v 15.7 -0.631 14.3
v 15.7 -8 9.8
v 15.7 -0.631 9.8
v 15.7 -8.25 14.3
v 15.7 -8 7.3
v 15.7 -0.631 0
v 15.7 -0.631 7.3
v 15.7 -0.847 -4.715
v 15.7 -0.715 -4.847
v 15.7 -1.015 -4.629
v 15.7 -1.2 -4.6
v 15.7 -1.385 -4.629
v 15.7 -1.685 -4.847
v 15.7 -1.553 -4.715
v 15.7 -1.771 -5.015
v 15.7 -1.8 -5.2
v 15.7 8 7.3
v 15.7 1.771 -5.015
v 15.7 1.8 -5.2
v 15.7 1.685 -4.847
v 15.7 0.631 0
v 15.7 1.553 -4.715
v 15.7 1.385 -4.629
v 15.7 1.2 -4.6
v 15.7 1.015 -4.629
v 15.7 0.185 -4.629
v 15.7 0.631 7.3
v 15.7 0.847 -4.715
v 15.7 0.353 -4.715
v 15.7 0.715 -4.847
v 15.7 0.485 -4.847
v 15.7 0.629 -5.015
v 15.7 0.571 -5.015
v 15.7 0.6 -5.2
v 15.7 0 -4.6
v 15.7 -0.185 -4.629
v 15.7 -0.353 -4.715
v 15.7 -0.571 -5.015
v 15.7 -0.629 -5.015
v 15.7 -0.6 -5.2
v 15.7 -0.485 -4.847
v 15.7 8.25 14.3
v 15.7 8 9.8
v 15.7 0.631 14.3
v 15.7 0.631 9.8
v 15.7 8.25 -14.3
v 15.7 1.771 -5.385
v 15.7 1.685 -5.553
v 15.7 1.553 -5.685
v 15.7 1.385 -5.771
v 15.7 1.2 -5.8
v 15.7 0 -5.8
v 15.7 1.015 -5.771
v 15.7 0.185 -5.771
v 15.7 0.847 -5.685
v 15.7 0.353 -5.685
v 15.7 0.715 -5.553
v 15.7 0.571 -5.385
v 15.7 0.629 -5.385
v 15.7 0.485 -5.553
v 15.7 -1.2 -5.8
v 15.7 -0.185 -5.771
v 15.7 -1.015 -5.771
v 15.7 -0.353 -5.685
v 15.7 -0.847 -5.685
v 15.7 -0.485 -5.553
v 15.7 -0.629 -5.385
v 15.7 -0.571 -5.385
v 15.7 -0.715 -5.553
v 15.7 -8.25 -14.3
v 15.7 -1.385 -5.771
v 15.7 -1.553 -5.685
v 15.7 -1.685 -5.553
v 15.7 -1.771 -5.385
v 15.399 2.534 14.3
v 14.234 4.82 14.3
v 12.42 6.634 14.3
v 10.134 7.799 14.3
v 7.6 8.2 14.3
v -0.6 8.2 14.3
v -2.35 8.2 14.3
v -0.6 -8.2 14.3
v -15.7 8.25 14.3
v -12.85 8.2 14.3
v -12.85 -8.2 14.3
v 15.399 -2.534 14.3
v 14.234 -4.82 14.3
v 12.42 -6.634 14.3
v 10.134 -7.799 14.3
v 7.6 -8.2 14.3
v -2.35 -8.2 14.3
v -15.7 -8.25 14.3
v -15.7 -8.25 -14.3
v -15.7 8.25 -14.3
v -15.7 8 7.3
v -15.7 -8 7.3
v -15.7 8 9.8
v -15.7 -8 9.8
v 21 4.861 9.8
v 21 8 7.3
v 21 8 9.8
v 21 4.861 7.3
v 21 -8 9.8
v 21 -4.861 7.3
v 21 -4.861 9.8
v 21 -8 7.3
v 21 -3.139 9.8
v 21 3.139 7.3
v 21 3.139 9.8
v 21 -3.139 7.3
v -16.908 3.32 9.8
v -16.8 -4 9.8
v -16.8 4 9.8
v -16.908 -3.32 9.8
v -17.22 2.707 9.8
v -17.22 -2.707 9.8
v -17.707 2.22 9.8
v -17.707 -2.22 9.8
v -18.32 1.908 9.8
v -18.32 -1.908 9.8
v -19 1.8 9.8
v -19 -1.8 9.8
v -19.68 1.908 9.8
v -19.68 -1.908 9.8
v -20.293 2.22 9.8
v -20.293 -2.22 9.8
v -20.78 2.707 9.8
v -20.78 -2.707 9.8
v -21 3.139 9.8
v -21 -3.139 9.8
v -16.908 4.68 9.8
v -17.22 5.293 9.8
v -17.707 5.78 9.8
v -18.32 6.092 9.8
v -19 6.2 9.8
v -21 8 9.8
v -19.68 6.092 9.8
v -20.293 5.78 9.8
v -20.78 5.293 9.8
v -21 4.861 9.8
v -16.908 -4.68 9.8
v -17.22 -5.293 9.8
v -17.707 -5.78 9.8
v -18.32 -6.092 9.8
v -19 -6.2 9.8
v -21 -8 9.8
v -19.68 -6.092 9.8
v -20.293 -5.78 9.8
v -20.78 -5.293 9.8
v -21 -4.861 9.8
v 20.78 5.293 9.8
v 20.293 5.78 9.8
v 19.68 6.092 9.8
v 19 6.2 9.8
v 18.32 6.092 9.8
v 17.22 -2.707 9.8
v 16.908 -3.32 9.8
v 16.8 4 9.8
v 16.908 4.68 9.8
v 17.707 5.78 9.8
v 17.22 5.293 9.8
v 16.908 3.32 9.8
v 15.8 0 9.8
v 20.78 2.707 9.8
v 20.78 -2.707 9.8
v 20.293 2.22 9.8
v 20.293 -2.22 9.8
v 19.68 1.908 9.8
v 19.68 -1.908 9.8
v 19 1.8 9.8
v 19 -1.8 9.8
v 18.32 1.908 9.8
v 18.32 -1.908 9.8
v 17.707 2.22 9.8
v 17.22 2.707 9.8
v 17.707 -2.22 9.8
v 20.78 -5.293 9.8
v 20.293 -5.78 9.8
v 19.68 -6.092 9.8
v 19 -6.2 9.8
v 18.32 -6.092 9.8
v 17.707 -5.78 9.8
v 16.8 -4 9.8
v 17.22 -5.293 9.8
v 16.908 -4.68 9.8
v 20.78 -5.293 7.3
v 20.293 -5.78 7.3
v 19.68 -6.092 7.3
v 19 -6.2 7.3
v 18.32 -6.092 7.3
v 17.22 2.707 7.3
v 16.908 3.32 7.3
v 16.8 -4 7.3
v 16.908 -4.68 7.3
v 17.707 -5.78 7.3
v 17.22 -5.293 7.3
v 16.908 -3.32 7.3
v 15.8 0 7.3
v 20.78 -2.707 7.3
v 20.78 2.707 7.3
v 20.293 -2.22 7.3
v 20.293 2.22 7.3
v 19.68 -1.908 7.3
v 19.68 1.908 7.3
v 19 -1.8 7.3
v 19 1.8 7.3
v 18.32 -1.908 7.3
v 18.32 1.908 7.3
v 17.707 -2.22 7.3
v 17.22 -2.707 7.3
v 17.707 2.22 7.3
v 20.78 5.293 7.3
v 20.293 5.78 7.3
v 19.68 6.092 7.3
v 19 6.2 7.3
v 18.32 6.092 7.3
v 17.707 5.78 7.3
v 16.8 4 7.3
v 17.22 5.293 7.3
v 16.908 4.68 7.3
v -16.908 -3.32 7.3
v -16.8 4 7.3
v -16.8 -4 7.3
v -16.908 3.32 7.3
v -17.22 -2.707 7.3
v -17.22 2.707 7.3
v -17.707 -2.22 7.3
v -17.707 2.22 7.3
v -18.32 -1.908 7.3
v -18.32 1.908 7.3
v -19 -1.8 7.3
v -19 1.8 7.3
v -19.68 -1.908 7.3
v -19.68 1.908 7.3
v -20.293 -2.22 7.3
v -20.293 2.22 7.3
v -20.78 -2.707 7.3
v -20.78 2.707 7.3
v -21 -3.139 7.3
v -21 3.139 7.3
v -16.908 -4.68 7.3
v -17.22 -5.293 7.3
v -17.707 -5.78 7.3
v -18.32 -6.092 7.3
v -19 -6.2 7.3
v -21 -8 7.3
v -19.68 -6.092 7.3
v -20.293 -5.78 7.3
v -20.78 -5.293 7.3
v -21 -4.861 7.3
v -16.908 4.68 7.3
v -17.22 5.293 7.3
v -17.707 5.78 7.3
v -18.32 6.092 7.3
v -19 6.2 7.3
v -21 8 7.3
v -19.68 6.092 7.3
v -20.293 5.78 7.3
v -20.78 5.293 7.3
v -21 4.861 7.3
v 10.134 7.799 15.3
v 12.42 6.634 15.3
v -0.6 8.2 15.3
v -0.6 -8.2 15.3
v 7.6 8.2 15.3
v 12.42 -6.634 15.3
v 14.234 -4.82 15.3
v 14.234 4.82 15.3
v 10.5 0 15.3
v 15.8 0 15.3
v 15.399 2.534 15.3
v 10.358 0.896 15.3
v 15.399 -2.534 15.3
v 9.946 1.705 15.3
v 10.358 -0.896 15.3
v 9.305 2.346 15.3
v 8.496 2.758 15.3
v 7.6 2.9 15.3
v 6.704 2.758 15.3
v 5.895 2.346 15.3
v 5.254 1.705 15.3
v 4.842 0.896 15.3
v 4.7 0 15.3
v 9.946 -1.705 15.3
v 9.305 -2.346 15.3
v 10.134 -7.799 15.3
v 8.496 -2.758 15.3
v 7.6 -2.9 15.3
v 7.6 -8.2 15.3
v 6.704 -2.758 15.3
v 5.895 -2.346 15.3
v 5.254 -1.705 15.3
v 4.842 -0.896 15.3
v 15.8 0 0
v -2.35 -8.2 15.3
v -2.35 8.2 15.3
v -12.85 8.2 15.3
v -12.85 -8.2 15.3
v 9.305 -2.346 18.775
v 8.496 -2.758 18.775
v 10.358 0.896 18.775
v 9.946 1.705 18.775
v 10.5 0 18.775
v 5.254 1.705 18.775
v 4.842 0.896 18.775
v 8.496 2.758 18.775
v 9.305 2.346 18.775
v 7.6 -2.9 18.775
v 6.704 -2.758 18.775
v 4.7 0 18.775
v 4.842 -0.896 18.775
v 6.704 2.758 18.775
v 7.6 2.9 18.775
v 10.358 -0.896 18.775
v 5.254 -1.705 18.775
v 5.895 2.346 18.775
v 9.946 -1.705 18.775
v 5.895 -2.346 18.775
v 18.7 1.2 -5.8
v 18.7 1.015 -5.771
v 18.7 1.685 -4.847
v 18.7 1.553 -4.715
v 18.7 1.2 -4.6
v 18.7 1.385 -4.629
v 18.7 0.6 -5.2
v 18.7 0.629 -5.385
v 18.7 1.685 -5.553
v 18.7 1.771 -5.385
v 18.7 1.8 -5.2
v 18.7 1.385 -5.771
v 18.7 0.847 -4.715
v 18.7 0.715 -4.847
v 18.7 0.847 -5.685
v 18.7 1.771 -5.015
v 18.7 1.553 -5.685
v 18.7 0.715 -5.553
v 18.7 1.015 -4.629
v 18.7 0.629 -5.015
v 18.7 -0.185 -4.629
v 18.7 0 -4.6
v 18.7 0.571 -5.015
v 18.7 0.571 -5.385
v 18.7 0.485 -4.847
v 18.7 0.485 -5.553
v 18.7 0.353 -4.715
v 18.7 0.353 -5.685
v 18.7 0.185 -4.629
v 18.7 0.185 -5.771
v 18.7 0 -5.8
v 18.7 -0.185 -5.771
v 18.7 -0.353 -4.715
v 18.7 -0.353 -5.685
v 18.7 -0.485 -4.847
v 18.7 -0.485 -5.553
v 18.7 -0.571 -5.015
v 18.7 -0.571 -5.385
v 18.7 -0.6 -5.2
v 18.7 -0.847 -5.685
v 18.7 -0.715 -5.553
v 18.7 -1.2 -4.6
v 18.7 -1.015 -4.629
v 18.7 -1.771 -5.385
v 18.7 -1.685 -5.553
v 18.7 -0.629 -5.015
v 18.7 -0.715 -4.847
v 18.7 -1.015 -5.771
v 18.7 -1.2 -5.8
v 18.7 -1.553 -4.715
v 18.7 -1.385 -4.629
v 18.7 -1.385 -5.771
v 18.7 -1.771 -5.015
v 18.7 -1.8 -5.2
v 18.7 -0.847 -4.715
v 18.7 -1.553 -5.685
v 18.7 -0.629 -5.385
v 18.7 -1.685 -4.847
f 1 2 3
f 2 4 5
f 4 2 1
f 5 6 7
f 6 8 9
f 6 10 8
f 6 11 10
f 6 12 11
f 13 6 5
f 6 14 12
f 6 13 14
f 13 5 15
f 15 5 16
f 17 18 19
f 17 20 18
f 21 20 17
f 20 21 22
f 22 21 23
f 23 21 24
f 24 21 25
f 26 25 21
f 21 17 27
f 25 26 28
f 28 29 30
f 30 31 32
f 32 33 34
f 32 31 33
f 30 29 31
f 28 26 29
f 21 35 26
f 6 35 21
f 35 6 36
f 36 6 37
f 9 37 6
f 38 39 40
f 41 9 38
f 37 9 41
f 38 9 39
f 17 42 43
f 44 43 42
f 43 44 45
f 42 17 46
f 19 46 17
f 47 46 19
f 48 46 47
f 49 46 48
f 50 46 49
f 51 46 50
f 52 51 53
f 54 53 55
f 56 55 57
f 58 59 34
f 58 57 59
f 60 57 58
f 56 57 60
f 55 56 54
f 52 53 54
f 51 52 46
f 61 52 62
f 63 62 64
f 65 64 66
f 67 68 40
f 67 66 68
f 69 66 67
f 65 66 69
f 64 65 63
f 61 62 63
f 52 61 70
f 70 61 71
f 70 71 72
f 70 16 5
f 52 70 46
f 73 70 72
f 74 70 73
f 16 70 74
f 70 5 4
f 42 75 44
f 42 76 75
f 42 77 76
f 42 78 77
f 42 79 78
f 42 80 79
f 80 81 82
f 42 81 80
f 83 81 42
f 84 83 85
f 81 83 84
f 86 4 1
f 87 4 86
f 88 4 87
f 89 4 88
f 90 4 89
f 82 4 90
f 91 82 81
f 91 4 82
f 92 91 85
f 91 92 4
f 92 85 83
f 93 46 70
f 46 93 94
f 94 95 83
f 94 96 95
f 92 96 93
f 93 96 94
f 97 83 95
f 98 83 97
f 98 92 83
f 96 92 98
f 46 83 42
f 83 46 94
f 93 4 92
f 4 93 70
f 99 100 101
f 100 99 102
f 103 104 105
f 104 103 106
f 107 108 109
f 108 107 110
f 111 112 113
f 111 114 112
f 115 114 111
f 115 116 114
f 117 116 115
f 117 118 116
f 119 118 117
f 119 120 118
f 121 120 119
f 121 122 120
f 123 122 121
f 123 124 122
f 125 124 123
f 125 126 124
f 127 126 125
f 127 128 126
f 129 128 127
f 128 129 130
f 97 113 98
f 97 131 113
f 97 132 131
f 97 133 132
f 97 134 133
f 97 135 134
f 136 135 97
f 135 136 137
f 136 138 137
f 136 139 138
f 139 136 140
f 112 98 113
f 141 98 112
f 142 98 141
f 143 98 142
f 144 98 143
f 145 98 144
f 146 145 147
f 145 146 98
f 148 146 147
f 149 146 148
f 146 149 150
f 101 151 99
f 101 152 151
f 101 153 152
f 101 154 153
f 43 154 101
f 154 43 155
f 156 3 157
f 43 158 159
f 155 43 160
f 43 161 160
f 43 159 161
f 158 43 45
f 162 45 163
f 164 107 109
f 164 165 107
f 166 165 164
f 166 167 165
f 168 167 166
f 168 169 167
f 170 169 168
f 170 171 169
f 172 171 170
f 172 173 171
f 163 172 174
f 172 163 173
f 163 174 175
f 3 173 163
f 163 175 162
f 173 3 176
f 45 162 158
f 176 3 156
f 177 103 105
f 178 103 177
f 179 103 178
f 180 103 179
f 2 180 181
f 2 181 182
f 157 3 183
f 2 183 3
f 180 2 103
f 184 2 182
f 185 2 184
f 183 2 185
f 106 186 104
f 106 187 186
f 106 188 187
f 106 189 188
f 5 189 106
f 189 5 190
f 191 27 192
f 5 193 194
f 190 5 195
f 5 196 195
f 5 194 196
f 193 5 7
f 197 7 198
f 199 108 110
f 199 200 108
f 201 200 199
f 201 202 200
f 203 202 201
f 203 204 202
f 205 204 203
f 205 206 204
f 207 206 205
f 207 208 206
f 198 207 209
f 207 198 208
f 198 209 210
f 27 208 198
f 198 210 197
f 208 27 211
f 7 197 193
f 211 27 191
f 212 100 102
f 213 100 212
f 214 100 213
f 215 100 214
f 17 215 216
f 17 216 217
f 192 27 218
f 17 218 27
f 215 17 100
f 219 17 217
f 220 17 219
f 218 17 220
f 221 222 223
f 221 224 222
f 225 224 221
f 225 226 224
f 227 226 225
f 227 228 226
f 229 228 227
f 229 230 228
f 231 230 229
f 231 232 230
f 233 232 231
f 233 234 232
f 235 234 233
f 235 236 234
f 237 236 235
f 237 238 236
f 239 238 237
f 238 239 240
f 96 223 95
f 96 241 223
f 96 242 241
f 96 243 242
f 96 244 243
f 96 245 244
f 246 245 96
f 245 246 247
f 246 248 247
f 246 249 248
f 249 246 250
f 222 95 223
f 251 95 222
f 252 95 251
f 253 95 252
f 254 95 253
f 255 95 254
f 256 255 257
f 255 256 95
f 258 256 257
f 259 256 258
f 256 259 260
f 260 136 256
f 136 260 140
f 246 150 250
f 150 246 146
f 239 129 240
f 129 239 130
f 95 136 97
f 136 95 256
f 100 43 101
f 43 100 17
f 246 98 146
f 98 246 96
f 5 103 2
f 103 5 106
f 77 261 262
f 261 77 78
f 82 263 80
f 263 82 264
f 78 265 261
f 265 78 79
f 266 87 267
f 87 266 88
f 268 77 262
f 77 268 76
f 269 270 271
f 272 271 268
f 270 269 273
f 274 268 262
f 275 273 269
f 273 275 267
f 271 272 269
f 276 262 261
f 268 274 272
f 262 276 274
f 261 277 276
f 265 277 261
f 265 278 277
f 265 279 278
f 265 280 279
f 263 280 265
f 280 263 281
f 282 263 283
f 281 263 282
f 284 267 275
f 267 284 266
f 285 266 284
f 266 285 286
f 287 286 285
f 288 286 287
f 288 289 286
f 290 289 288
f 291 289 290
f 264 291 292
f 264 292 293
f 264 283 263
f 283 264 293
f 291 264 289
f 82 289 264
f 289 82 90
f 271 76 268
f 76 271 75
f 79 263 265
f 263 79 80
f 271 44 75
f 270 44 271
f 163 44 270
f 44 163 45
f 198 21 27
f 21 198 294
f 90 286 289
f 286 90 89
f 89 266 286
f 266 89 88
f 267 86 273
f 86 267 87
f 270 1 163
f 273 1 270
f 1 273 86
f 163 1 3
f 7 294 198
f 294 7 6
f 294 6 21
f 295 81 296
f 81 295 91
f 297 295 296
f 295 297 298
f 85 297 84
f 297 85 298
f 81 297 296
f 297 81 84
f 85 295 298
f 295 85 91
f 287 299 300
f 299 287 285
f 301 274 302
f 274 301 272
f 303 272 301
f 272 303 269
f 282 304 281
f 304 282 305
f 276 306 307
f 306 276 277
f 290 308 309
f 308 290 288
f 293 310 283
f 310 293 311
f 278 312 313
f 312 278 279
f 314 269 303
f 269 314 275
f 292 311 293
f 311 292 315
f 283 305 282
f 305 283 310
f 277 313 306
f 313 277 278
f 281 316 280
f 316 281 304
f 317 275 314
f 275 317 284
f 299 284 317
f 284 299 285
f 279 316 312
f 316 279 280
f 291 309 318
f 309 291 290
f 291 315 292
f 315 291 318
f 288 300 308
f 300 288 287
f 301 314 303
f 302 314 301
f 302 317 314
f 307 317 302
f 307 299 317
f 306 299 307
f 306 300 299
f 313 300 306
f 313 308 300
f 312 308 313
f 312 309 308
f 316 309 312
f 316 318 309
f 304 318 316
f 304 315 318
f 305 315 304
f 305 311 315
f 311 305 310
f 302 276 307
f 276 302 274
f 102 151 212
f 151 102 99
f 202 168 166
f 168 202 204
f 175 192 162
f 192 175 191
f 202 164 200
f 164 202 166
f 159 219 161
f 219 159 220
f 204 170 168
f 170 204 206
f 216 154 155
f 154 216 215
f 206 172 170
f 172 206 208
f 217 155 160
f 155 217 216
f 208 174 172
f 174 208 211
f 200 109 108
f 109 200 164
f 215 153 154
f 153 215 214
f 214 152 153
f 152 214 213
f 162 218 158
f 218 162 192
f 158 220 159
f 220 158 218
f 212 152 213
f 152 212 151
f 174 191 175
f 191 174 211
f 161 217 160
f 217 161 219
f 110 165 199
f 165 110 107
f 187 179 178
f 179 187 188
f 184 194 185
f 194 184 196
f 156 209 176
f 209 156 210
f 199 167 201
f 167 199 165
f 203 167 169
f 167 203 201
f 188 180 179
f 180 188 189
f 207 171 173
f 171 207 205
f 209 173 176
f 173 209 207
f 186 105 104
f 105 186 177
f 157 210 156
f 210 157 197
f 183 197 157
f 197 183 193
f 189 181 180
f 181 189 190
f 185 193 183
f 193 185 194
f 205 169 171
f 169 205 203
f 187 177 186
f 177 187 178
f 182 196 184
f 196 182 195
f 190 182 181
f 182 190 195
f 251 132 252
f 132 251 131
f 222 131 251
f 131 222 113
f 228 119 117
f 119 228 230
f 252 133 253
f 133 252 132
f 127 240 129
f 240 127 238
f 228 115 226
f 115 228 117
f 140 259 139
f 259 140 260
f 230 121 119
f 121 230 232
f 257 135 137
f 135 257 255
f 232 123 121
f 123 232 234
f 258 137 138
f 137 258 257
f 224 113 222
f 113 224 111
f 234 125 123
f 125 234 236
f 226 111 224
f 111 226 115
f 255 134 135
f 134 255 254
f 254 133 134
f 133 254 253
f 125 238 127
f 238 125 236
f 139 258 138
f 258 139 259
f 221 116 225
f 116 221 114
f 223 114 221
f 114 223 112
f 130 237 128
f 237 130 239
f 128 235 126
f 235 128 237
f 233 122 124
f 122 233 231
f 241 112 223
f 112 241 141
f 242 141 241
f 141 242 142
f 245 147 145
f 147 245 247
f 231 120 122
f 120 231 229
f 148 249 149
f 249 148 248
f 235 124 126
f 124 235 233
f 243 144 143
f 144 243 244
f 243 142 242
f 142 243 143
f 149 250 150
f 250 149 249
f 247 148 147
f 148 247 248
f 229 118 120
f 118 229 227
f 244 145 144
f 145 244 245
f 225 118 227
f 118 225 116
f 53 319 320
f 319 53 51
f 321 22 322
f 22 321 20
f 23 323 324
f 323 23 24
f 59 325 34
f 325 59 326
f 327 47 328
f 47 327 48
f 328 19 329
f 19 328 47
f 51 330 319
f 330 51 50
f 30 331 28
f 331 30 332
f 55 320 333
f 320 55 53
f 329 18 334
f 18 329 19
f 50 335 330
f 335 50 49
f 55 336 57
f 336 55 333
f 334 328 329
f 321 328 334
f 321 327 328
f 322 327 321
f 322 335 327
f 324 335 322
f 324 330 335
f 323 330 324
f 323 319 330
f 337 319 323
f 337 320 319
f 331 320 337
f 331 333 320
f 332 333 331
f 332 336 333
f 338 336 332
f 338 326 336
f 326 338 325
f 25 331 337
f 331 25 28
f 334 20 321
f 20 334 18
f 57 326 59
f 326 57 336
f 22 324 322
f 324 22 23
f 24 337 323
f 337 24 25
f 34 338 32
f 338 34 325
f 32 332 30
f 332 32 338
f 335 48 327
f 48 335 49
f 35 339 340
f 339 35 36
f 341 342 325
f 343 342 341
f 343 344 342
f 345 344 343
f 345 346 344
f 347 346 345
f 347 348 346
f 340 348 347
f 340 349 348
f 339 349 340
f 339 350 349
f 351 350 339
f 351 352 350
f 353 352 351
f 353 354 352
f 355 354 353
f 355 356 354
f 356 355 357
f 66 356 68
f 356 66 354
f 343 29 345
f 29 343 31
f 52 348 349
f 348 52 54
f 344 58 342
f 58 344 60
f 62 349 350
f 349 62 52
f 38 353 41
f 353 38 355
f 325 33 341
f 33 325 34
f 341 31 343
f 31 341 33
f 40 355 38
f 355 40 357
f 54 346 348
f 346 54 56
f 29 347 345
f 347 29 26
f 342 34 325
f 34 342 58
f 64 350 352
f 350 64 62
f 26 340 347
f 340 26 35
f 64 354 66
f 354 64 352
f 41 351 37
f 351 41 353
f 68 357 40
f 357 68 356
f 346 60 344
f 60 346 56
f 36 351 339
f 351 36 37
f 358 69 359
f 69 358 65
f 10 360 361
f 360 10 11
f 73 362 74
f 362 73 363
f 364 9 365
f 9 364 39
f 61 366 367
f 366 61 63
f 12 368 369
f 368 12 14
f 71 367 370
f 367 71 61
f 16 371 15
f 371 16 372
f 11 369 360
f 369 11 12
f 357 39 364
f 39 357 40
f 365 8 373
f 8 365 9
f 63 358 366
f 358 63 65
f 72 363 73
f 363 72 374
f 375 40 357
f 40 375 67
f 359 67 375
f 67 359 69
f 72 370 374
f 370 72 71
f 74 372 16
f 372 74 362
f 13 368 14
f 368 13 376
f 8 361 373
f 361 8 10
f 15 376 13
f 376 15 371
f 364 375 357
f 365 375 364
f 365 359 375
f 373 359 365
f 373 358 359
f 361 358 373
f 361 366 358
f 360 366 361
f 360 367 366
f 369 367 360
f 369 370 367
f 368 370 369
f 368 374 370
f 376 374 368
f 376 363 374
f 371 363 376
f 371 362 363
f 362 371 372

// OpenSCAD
24g_motor();

module 9g_motor(){
	difference(){			
		union(){
			color("blue") cube([23,12.5,22], center=true);
			color("blue") translate([0,0,5]) cube([32,12,2], center=true);
			color("blue") translate([5.5,0,2.75]) cylinder(r=6, h=25.75, $fn=20, center=true);
			color("blue") translate([-.5,0,2.75]) cylinder(r=1, h=25.75, $fn=20, center=true);
			color("blue") translate([-1,0,2.75]) cube([5,5.6,24.5], center=true);		
			color("white") translate([5.5,0,3.65]) cylinder(r=2.35, h=29.25, $fn=20, center=true);				
		}
		translate([10,0,-11]) rotate([0,-30,0]) cube([8,13,4], center=true);
		for ( hole = [14,-14] ){
			translate([hole,0,5]) cylinder(r=2.2, h=4, $fn=20, center=true);
		}	
	}
}

module 24g_motor(){
	difference(){			
		union(){
			color("black") cube([31.4,16.5,28.6], center=true);
			color("black") translate([0,0,8.55]) cube([42,16,2.5], center=true);
            
            color("black")
            hull() {
			 translate([7.6,0,0]) cylinder(r=8.2, h=15.3, $fn=20);
                translate([3.5,0,7.65])
                cube([8.2,16.4,15.3], center=true);

            }
            color("black")
            translate([-7.6,0,7.65])
                cube([10.5,16.4,15.3], center=true);
		
			color("gold") translate([7.6,0,4.15]) cylinder(r=2.9, h=29.25, $fn=20, center=true);				
		}
		for ( hole = [19,-19] ){
			translate([hole,4,8]) cylinder(r=2.2, h=4, $fn=20, center=true);
            translate([hole,-4,8]) cylinder(r=2.2, h=4, $fn=20, center=true);
		}	
	}
    
    translate([15.7,1.2,-5.2])
    rotate([0,90,0])
    cylinder(r=0.6,h=3,$fn=20);
    color("red")
    translate([15.7,0,-5.2])
    rotate([0,90,0])
    cylinder(r=0.6,h=3,$fn=20);
    color("#604030")
    translate([15.7,-1.2,-5.2])
    rotate([0,90,0])
    cylinder(r=0.6,h=3,$fn=20);
}
